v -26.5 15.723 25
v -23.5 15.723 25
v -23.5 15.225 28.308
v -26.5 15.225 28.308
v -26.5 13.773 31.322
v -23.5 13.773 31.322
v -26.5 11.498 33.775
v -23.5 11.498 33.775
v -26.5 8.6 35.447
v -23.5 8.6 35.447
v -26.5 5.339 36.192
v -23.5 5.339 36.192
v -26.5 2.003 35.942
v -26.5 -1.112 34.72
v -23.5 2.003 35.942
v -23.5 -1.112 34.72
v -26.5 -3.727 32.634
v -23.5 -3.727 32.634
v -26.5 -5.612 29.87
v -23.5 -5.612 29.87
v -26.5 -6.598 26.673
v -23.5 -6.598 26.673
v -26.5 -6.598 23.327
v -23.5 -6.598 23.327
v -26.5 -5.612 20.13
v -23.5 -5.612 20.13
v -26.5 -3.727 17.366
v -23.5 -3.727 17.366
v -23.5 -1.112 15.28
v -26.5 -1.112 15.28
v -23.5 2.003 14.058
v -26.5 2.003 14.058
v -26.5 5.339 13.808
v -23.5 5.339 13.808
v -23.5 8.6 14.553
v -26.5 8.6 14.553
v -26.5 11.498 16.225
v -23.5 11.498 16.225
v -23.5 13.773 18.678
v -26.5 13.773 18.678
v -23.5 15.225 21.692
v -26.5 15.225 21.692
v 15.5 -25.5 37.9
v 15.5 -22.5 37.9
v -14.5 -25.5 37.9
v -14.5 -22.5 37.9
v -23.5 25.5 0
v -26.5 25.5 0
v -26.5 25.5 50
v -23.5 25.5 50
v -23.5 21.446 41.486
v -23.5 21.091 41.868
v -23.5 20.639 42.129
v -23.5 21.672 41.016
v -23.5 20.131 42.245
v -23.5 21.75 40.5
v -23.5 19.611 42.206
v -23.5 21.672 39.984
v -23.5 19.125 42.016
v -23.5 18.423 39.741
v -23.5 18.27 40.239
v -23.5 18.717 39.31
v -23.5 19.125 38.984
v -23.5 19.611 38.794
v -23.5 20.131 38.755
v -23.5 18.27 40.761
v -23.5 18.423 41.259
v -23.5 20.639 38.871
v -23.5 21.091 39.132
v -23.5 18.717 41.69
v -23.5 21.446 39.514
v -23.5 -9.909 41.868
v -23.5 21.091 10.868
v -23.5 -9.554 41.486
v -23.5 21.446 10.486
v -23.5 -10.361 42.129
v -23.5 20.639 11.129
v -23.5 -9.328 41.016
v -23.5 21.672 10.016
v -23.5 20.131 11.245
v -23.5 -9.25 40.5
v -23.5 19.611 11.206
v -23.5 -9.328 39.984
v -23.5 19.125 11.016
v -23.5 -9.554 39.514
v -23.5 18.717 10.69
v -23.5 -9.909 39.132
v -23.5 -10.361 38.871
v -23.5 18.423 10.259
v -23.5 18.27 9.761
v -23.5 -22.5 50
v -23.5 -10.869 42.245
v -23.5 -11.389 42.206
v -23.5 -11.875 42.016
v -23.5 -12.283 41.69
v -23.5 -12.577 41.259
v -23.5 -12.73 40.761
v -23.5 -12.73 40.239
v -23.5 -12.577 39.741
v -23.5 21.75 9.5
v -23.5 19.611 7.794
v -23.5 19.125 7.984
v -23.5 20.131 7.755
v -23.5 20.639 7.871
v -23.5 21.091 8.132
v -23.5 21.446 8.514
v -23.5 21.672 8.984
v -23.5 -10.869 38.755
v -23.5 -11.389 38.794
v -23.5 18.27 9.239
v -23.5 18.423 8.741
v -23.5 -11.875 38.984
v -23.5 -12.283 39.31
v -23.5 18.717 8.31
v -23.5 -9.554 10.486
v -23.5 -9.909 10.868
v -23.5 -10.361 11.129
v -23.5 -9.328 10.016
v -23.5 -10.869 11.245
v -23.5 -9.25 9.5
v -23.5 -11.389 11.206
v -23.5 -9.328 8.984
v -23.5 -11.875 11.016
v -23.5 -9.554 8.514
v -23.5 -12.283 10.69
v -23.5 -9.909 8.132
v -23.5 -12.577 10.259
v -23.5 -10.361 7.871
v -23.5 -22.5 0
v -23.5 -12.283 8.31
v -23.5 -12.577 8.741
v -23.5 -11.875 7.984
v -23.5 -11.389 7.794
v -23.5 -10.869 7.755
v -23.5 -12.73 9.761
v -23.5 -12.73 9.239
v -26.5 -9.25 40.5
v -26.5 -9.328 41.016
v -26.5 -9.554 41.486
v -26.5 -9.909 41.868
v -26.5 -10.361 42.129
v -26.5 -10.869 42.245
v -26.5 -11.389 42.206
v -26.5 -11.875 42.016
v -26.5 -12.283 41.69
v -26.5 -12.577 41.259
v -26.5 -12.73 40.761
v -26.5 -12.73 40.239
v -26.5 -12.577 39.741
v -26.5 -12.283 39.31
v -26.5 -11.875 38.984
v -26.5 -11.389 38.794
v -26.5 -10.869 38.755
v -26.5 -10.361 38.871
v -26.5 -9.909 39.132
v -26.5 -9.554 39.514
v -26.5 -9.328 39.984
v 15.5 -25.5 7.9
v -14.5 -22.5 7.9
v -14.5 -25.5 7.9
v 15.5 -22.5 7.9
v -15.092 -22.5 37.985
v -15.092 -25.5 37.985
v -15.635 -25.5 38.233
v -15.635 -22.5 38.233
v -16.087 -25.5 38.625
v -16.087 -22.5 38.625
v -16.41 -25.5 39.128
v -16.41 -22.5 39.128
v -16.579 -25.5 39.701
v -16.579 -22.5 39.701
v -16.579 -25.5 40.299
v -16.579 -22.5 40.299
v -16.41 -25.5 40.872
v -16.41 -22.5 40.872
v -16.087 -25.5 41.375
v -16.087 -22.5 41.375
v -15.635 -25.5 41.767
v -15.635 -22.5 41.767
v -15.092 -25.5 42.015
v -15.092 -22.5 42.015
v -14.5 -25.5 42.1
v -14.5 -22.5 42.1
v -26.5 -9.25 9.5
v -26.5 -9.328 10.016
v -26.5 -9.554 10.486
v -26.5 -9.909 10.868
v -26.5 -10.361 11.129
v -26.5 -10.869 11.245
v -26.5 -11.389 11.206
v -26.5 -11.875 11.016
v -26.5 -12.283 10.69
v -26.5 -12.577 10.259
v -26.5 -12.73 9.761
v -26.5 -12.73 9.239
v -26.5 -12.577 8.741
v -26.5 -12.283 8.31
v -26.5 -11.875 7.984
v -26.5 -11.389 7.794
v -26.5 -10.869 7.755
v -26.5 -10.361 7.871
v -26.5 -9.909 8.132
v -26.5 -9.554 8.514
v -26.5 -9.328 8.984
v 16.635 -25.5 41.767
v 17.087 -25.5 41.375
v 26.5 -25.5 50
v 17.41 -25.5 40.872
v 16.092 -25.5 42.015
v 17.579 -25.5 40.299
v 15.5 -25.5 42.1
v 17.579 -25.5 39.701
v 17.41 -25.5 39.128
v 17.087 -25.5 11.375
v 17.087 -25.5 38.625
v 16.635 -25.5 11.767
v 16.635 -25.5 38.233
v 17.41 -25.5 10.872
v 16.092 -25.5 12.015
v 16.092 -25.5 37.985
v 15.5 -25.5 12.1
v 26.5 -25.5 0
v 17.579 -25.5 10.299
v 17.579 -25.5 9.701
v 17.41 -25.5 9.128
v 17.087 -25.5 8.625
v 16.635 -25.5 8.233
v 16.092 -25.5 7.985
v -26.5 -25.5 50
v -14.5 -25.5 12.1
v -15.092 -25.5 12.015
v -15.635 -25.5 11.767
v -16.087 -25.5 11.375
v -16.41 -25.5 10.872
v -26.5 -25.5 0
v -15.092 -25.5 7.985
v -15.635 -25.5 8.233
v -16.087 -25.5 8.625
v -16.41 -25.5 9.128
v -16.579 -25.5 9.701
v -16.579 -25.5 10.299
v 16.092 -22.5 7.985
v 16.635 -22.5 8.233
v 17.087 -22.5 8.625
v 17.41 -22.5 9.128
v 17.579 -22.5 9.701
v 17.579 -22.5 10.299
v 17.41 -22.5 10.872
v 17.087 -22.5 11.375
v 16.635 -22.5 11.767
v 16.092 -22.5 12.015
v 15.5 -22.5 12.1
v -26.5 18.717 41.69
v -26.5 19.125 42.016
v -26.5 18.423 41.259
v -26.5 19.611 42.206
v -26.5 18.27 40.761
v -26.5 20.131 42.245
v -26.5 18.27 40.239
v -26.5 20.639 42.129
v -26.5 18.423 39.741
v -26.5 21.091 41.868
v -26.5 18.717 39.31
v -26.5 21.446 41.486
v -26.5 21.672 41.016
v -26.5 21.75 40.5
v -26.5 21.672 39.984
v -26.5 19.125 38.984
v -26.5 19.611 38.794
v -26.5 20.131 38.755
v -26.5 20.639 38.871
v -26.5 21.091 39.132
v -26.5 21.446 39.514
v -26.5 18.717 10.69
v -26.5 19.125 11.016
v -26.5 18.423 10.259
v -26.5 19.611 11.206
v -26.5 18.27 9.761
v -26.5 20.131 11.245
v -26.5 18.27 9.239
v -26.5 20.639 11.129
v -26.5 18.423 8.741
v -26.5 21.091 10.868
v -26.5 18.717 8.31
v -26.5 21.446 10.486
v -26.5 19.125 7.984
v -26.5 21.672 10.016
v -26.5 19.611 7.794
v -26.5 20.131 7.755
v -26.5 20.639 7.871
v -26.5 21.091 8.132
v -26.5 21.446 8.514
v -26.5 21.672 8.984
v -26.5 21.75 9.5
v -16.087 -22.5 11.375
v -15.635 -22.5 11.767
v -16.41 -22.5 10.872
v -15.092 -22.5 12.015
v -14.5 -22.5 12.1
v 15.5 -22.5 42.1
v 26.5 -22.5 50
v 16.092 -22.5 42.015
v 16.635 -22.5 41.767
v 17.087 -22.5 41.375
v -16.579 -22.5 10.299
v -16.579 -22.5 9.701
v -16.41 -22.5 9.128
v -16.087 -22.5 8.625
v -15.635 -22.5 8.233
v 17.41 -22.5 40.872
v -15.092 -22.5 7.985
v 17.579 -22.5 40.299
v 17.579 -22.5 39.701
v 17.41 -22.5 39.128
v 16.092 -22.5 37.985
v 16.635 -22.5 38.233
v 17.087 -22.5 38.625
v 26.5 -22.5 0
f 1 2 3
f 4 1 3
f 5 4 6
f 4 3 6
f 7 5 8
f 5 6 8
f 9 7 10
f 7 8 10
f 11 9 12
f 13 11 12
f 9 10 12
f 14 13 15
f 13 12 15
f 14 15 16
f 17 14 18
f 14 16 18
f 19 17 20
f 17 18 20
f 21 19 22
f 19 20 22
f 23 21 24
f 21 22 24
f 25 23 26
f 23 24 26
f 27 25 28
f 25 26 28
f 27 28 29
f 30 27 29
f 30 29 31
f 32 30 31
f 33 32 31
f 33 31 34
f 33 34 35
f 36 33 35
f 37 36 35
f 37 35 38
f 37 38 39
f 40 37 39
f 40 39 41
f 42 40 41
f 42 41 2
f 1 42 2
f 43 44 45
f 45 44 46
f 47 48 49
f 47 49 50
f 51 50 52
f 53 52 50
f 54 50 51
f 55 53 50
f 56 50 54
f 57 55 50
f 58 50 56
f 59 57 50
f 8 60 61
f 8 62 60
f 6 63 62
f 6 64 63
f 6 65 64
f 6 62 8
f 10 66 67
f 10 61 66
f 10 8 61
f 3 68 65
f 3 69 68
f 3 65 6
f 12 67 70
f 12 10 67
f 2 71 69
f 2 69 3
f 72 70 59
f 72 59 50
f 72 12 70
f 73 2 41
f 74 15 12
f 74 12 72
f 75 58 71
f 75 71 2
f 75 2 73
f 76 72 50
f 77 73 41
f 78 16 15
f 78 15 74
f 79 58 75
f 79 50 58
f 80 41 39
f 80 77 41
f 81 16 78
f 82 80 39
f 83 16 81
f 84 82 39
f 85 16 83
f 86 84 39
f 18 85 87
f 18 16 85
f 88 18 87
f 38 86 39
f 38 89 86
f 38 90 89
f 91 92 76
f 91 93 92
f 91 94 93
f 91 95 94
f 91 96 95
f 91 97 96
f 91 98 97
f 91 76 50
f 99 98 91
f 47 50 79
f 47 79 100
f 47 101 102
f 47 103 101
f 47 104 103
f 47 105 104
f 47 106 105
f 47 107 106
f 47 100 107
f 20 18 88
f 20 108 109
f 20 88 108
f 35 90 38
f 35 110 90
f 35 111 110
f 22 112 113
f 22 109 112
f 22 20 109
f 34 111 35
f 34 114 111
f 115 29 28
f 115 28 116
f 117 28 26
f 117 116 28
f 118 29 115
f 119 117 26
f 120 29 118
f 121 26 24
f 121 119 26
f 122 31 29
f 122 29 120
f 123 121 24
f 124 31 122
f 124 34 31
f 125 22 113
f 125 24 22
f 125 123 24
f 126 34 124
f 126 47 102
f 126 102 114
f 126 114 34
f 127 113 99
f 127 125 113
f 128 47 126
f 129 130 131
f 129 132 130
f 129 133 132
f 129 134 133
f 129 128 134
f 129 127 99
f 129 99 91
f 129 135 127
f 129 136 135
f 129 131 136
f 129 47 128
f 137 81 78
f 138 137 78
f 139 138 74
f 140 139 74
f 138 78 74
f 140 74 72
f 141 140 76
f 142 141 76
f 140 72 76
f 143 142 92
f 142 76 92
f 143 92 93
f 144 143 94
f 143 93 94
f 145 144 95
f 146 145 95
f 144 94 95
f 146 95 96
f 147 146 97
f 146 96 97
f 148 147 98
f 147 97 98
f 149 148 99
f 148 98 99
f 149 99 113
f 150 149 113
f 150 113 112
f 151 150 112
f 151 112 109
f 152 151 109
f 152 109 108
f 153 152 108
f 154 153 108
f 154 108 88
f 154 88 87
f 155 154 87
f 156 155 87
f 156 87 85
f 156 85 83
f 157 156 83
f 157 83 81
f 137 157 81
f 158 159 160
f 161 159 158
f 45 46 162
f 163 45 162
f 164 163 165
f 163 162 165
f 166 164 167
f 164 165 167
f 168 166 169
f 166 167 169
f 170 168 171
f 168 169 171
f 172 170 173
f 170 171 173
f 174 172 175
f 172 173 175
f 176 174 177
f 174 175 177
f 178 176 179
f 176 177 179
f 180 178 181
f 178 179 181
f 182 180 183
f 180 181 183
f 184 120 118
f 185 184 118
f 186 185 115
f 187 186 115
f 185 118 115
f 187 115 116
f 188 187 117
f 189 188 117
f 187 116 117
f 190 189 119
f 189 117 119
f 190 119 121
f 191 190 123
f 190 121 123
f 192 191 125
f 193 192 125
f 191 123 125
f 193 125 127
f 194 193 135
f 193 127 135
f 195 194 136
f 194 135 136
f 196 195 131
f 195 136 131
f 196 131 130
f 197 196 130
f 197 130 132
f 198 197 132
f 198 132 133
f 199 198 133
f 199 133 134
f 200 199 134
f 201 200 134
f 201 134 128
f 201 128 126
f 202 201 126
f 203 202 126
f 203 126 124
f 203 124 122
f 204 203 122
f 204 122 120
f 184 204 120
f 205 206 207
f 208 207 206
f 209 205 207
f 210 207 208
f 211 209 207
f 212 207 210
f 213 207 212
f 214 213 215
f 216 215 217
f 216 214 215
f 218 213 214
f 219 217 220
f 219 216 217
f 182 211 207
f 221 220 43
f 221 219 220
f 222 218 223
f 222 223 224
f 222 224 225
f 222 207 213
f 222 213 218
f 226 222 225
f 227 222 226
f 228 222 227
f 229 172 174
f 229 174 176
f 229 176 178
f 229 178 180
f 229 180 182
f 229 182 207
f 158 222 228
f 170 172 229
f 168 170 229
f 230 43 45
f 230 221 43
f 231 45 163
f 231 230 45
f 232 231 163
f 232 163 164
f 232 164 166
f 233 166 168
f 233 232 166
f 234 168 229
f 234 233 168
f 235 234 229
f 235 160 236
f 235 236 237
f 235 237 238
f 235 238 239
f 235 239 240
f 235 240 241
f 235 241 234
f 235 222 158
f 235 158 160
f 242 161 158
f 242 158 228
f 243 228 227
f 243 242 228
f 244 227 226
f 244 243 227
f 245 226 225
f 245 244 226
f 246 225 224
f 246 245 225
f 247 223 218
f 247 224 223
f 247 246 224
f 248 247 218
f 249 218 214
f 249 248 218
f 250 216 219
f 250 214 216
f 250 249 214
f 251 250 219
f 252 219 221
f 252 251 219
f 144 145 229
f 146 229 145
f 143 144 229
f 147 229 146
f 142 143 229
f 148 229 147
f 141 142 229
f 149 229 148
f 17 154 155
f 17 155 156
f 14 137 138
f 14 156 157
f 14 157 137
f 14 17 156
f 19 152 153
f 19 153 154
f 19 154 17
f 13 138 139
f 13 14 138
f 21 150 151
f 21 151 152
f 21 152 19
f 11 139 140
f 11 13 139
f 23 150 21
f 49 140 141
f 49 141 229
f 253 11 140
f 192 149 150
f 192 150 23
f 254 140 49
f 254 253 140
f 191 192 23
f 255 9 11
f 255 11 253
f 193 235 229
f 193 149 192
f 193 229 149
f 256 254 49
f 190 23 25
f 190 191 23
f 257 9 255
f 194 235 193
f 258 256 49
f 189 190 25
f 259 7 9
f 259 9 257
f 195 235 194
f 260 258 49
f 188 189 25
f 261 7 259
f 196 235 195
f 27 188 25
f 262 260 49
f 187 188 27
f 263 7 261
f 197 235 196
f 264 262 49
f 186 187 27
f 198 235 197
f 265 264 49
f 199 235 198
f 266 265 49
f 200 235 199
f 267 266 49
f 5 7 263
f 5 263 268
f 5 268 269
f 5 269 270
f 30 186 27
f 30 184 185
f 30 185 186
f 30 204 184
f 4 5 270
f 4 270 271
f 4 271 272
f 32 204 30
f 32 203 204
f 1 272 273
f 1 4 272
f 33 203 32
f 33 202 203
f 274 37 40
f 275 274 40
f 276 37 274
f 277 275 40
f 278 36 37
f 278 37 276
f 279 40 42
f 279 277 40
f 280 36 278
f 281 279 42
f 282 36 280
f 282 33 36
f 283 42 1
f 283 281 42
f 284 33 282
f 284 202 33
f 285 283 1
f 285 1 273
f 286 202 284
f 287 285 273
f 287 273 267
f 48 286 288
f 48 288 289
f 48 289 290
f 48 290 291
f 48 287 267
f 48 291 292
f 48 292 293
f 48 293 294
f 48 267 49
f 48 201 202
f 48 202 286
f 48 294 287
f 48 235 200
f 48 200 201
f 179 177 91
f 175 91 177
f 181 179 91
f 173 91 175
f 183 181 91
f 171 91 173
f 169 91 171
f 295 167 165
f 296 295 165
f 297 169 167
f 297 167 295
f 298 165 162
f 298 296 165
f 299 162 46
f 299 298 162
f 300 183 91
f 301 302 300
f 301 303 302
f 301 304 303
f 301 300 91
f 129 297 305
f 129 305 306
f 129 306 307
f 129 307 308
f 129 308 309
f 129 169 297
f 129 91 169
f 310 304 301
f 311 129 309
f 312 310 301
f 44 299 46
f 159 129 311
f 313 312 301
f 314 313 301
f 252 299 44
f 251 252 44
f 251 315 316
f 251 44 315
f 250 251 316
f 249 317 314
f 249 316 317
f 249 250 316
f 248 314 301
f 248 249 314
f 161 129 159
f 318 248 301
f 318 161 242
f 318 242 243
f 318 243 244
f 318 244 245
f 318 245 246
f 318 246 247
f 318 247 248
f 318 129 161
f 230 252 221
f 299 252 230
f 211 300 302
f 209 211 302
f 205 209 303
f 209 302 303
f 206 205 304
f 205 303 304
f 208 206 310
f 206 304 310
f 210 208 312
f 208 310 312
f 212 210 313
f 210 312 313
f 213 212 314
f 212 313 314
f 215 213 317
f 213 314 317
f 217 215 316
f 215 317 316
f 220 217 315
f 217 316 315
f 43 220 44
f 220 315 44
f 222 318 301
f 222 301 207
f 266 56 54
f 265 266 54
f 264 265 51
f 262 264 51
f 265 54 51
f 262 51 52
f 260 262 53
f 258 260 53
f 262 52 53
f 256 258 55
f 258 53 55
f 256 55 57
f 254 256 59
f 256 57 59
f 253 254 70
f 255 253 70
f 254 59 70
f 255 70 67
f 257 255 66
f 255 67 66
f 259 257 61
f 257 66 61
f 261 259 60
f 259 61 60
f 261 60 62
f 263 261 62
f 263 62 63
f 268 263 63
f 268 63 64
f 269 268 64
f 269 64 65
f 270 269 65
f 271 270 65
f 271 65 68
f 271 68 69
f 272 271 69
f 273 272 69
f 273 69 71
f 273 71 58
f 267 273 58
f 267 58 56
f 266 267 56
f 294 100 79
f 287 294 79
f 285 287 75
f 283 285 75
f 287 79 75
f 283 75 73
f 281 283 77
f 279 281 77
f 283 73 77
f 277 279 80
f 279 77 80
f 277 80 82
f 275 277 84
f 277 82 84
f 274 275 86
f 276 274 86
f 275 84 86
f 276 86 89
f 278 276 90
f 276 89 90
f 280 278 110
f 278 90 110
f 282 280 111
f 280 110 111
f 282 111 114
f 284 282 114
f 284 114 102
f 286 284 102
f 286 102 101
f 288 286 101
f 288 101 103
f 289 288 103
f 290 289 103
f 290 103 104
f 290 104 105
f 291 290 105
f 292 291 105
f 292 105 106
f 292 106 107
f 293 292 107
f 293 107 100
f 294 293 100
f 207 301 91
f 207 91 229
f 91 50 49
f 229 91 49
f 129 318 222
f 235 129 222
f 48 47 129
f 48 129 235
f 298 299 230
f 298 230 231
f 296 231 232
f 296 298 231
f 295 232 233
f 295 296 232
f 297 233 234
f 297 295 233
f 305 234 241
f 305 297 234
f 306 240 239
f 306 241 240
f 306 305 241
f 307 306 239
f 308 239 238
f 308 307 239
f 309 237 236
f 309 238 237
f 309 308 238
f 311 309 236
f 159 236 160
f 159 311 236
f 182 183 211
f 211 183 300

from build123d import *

# Parameters (mm, degrees)
EXTRUDE_1_DEPTH     = 50
SKETCH_3_R          = 11.223257521
SKETCH_3_R_2        = 1.75
CUT_EXTRUDE_1_DEPTH = 76.168144849
CUT_EXTRUDE_2_DEPTH = 75.204110398


with BuildPart() as part:
    # 草图2 → 凸台-拉伸1 (new body)
    with BuildSketch(Plane.XY):
        Polygon((-23.5, 25.5), (-23.5, -22.5), (26.5, -22.5), (26.5, -25.5), (-26.5, -25.5), (-26.5, 25.5), align=None)
    extrude(amount=EXTRUDE_1_DEPTH)

    # 草图3 → 切除-拉伸1 (cut, through all)
    with BuildSketch(Plane(origin=(-23.5, 0, 0), x_dir=(0, 0, -1), z_dir=(1, 0, 0))):
        with Locations(Location((-25, 4.5, 0), (0, 0, 90))):
            Circle(SKETCH_3_R)
        with Locations(Location((-40.5, 20, 0), (0, 0, 90))):
            Circle(SKETCH_3_R_2)
        with Locations(Location((-9.5, 20, 0), (0, 0, 90))):
            Circle(SKETCH_3_R_2)
        with Locations(Location((-9.5, -11, 0), (0, 0, 90))):
            Circle(SKETCH_3_R_2)
        with Locations(Location((-40.5, -11, 0), (0, 0, 90))):
            Circle(SKETCH_3_R_2)
    extrude(amount=-CUT_EXTRUDE_1_DEPTH, mode=Mode.SUBTRACT)

    # 草图4 → 切除-拉伸2 (cut, through all)
    with BuildSketch(Plane(origin=(0, -22.5, 0), x_dir=(1, 0, 0), z_dir=(0, 1, 0))):
        with BuildLine():
            Line((-14.5, -7.9), (15.5, -7.9))
            ThreePointArc((15.5, -7.9), (17.6, -10), (15.5, -12.1))
            Line((15.5, -12.1), (-14.5, -12.1))
            ThreePointArc((-14.5, -12.1), (-16.6, -10), (-14.5, -7.9))
        make_face()
        with BuildLine():
            Line((15.5, -37.9), (-14.5, -37.9))
            ThreePointArc((-14.5, -37.9), (-16.6, -40), (-14.5, -42.1))
            Line((-14.5, -42.1), (15.5, -42.1))
            ThreePointArc((15.5, -42.1), (17.6, -40), (15.5, -37.9))
        make_face()
    extrude(amount=-CUT_EXTRUDE_2_DEPTH, mode=Mode.SUBTRACT)


solid = part.part
